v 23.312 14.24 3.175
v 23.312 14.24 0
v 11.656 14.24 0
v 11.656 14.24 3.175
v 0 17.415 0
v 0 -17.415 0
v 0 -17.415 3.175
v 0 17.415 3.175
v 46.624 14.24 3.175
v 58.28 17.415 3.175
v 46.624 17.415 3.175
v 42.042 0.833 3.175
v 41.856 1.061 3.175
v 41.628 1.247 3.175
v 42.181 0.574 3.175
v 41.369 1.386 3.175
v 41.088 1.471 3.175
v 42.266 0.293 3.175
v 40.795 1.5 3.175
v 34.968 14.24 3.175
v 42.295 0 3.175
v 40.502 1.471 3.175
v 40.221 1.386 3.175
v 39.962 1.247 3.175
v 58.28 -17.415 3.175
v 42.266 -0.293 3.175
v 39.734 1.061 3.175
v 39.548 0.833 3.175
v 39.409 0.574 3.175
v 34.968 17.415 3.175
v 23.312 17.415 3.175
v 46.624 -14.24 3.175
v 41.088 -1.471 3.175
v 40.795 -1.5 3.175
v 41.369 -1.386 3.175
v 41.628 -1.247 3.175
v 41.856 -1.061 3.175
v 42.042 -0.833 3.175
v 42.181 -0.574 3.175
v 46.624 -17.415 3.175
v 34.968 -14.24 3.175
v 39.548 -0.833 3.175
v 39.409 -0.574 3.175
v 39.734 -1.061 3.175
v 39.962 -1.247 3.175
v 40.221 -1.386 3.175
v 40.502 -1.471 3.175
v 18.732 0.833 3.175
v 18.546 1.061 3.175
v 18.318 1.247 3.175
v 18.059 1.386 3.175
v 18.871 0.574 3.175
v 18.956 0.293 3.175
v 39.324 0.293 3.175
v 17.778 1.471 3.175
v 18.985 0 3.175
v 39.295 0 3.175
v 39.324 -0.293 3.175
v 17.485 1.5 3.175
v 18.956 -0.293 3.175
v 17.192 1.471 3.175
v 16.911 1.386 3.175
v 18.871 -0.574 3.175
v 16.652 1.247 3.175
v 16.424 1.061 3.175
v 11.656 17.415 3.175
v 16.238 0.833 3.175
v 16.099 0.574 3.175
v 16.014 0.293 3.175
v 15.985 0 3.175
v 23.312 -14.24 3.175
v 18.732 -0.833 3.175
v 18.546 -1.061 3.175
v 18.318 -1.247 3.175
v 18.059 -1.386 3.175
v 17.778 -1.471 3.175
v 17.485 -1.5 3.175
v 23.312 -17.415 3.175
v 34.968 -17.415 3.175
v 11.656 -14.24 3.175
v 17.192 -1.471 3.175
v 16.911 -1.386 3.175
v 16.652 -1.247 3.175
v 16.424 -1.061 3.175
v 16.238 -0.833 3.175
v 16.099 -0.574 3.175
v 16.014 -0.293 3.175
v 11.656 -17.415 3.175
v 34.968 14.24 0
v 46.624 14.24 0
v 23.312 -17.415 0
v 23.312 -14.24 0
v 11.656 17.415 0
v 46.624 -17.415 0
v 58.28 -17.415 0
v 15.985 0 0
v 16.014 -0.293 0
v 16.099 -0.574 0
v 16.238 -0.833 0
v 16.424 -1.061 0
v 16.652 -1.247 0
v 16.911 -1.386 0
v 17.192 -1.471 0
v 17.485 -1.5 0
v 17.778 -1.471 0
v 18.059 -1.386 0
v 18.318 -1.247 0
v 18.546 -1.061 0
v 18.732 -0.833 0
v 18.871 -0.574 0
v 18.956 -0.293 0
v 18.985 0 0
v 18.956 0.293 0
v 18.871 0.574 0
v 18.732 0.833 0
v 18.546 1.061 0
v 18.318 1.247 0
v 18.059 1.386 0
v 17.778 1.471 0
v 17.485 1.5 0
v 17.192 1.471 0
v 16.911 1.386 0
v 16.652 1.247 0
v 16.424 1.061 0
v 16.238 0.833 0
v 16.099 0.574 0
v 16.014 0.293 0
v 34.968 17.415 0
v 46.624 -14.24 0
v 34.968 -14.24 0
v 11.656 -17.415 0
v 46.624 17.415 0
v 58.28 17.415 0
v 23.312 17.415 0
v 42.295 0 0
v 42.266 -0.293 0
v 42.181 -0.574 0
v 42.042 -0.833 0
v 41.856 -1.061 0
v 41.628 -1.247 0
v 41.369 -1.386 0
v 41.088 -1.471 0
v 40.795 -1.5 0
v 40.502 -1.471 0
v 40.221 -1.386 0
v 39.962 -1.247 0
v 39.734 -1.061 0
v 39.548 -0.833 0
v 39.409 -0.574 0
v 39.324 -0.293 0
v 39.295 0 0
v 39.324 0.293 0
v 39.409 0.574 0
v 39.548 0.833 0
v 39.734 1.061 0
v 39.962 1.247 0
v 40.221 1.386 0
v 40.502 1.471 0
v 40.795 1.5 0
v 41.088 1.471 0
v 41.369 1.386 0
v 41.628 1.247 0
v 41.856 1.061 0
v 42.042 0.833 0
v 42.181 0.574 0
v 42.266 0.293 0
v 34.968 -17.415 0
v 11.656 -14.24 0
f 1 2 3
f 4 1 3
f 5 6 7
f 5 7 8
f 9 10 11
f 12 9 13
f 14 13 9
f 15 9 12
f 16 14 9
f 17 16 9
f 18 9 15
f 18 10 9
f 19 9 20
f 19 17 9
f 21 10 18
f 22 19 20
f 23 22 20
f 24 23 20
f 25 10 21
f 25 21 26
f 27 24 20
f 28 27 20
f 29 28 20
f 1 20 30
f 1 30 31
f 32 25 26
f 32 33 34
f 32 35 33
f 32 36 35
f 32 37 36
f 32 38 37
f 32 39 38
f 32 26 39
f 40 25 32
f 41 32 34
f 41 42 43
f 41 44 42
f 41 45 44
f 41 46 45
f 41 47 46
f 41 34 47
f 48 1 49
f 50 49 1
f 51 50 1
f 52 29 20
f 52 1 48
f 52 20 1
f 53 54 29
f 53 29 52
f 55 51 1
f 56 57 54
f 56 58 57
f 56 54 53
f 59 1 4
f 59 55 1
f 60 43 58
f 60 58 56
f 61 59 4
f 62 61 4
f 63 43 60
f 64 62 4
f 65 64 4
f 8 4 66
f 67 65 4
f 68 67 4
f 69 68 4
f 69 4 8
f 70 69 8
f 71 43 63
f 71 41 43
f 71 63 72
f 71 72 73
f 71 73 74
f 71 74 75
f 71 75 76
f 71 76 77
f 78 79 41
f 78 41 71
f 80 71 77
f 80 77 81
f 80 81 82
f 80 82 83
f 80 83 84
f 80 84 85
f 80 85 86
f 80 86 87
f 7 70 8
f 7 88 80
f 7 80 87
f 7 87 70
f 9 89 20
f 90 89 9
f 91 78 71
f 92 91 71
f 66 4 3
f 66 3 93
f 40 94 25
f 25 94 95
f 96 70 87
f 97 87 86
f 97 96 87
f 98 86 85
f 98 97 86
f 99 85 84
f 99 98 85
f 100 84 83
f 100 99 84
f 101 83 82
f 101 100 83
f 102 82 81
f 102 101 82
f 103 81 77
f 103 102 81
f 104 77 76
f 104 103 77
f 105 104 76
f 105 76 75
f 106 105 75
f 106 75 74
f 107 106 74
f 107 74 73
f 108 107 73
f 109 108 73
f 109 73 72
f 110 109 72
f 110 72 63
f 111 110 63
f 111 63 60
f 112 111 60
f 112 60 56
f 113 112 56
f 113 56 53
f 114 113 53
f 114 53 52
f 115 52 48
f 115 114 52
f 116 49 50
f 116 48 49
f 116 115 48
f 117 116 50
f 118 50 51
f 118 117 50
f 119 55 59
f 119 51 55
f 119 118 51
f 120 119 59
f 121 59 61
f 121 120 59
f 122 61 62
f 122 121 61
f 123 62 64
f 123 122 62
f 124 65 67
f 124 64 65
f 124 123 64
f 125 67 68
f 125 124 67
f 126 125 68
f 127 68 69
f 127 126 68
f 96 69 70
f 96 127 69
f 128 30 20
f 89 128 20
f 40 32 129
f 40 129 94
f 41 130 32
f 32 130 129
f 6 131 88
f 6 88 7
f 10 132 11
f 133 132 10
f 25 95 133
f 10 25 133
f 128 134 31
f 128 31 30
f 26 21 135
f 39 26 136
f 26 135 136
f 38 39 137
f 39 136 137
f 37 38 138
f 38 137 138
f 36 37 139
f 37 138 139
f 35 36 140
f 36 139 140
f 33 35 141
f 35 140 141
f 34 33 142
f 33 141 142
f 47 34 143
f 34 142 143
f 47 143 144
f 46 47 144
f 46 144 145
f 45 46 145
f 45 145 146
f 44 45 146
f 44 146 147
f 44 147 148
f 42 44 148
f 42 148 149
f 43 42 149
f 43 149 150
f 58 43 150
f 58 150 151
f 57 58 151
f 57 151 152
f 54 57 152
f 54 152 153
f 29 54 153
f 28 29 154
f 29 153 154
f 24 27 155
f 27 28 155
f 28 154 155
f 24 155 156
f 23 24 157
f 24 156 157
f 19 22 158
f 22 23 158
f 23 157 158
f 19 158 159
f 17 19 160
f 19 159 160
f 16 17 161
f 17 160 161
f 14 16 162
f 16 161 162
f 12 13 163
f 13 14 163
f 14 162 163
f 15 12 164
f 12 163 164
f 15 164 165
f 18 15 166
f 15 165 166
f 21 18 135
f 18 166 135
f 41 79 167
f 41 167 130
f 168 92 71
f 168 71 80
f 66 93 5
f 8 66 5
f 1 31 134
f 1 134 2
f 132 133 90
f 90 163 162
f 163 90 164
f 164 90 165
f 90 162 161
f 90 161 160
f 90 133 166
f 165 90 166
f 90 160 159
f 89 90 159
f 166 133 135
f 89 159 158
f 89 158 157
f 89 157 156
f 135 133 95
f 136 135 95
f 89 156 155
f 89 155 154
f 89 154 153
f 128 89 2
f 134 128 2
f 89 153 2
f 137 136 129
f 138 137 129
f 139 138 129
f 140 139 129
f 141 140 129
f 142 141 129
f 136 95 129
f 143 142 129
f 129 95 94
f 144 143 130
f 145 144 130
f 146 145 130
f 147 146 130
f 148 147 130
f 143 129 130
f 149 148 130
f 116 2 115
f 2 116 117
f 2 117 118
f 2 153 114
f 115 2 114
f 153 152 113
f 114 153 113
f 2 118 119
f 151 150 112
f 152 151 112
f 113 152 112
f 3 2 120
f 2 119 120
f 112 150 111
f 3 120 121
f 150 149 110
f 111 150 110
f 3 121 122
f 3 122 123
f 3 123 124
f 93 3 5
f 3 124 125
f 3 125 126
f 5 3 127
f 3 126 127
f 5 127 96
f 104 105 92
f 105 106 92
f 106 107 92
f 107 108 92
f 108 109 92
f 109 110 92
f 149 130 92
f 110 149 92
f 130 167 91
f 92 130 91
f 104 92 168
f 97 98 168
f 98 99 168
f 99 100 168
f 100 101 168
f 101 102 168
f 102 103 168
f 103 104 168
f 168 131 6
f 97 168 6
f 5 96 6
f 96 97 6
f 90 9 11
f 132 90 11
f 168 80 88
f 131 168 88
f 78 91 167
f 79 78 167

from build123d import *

# Parameters (mm, degrees)
BOSS_EXTRUDE1_DEPTH = 3.175


with BuildPart() as part:
    # Sketch1 → Boss-Extrude1 (new body)
    with BuildSketch(Plane.XY):
        with BuildLine():
            Line((18.985, 0), (29.14, 0))
            Line((29.14, 0), (29.14, 14.24))
            Line((29.14, 14.24), (29.14, 17.415))
            Line((29.14, 17.415), (23.312, 17.415))
            Line((23.312, 17.415), (23.312, 14.24))
            Line((23.312, 14.24), (11.656, 14.24))
            Line((11.656, 14.24), (11.656, 17.415))
            Line((11.656, 17.415), (0, 17.415))
            Line((0, 17.415), (0, 14.24))
            Line((0, 14.24), (0, 0))
            Line((0, 0), (15.985, 0))
            ThreePointArc((15.985, 0), (17.485, 1.5), (18.985, 0))
        make_face()
    extrude(amount=BOSS_EXTRUDE1_DEPTH)

    # Mirror1: part across plane


with BuildPart() as part_1:
    add(part.part)
    add(part.part.mirror(Plane(origin=(0, 0, 3.175), x_dir=(0, 0, 1), z_dir=(0, 1, 0))))

    # Mirror3: part across plane


with BuildPart() as part_2:
    add(part_1.part)
    add(part_1.part.mirror(Plane(origin=(29.14, 14.24, 3.175), x_dir=(0, 0, 1), z_dir=(-1, 0, 0))))


solid = part_2.part
